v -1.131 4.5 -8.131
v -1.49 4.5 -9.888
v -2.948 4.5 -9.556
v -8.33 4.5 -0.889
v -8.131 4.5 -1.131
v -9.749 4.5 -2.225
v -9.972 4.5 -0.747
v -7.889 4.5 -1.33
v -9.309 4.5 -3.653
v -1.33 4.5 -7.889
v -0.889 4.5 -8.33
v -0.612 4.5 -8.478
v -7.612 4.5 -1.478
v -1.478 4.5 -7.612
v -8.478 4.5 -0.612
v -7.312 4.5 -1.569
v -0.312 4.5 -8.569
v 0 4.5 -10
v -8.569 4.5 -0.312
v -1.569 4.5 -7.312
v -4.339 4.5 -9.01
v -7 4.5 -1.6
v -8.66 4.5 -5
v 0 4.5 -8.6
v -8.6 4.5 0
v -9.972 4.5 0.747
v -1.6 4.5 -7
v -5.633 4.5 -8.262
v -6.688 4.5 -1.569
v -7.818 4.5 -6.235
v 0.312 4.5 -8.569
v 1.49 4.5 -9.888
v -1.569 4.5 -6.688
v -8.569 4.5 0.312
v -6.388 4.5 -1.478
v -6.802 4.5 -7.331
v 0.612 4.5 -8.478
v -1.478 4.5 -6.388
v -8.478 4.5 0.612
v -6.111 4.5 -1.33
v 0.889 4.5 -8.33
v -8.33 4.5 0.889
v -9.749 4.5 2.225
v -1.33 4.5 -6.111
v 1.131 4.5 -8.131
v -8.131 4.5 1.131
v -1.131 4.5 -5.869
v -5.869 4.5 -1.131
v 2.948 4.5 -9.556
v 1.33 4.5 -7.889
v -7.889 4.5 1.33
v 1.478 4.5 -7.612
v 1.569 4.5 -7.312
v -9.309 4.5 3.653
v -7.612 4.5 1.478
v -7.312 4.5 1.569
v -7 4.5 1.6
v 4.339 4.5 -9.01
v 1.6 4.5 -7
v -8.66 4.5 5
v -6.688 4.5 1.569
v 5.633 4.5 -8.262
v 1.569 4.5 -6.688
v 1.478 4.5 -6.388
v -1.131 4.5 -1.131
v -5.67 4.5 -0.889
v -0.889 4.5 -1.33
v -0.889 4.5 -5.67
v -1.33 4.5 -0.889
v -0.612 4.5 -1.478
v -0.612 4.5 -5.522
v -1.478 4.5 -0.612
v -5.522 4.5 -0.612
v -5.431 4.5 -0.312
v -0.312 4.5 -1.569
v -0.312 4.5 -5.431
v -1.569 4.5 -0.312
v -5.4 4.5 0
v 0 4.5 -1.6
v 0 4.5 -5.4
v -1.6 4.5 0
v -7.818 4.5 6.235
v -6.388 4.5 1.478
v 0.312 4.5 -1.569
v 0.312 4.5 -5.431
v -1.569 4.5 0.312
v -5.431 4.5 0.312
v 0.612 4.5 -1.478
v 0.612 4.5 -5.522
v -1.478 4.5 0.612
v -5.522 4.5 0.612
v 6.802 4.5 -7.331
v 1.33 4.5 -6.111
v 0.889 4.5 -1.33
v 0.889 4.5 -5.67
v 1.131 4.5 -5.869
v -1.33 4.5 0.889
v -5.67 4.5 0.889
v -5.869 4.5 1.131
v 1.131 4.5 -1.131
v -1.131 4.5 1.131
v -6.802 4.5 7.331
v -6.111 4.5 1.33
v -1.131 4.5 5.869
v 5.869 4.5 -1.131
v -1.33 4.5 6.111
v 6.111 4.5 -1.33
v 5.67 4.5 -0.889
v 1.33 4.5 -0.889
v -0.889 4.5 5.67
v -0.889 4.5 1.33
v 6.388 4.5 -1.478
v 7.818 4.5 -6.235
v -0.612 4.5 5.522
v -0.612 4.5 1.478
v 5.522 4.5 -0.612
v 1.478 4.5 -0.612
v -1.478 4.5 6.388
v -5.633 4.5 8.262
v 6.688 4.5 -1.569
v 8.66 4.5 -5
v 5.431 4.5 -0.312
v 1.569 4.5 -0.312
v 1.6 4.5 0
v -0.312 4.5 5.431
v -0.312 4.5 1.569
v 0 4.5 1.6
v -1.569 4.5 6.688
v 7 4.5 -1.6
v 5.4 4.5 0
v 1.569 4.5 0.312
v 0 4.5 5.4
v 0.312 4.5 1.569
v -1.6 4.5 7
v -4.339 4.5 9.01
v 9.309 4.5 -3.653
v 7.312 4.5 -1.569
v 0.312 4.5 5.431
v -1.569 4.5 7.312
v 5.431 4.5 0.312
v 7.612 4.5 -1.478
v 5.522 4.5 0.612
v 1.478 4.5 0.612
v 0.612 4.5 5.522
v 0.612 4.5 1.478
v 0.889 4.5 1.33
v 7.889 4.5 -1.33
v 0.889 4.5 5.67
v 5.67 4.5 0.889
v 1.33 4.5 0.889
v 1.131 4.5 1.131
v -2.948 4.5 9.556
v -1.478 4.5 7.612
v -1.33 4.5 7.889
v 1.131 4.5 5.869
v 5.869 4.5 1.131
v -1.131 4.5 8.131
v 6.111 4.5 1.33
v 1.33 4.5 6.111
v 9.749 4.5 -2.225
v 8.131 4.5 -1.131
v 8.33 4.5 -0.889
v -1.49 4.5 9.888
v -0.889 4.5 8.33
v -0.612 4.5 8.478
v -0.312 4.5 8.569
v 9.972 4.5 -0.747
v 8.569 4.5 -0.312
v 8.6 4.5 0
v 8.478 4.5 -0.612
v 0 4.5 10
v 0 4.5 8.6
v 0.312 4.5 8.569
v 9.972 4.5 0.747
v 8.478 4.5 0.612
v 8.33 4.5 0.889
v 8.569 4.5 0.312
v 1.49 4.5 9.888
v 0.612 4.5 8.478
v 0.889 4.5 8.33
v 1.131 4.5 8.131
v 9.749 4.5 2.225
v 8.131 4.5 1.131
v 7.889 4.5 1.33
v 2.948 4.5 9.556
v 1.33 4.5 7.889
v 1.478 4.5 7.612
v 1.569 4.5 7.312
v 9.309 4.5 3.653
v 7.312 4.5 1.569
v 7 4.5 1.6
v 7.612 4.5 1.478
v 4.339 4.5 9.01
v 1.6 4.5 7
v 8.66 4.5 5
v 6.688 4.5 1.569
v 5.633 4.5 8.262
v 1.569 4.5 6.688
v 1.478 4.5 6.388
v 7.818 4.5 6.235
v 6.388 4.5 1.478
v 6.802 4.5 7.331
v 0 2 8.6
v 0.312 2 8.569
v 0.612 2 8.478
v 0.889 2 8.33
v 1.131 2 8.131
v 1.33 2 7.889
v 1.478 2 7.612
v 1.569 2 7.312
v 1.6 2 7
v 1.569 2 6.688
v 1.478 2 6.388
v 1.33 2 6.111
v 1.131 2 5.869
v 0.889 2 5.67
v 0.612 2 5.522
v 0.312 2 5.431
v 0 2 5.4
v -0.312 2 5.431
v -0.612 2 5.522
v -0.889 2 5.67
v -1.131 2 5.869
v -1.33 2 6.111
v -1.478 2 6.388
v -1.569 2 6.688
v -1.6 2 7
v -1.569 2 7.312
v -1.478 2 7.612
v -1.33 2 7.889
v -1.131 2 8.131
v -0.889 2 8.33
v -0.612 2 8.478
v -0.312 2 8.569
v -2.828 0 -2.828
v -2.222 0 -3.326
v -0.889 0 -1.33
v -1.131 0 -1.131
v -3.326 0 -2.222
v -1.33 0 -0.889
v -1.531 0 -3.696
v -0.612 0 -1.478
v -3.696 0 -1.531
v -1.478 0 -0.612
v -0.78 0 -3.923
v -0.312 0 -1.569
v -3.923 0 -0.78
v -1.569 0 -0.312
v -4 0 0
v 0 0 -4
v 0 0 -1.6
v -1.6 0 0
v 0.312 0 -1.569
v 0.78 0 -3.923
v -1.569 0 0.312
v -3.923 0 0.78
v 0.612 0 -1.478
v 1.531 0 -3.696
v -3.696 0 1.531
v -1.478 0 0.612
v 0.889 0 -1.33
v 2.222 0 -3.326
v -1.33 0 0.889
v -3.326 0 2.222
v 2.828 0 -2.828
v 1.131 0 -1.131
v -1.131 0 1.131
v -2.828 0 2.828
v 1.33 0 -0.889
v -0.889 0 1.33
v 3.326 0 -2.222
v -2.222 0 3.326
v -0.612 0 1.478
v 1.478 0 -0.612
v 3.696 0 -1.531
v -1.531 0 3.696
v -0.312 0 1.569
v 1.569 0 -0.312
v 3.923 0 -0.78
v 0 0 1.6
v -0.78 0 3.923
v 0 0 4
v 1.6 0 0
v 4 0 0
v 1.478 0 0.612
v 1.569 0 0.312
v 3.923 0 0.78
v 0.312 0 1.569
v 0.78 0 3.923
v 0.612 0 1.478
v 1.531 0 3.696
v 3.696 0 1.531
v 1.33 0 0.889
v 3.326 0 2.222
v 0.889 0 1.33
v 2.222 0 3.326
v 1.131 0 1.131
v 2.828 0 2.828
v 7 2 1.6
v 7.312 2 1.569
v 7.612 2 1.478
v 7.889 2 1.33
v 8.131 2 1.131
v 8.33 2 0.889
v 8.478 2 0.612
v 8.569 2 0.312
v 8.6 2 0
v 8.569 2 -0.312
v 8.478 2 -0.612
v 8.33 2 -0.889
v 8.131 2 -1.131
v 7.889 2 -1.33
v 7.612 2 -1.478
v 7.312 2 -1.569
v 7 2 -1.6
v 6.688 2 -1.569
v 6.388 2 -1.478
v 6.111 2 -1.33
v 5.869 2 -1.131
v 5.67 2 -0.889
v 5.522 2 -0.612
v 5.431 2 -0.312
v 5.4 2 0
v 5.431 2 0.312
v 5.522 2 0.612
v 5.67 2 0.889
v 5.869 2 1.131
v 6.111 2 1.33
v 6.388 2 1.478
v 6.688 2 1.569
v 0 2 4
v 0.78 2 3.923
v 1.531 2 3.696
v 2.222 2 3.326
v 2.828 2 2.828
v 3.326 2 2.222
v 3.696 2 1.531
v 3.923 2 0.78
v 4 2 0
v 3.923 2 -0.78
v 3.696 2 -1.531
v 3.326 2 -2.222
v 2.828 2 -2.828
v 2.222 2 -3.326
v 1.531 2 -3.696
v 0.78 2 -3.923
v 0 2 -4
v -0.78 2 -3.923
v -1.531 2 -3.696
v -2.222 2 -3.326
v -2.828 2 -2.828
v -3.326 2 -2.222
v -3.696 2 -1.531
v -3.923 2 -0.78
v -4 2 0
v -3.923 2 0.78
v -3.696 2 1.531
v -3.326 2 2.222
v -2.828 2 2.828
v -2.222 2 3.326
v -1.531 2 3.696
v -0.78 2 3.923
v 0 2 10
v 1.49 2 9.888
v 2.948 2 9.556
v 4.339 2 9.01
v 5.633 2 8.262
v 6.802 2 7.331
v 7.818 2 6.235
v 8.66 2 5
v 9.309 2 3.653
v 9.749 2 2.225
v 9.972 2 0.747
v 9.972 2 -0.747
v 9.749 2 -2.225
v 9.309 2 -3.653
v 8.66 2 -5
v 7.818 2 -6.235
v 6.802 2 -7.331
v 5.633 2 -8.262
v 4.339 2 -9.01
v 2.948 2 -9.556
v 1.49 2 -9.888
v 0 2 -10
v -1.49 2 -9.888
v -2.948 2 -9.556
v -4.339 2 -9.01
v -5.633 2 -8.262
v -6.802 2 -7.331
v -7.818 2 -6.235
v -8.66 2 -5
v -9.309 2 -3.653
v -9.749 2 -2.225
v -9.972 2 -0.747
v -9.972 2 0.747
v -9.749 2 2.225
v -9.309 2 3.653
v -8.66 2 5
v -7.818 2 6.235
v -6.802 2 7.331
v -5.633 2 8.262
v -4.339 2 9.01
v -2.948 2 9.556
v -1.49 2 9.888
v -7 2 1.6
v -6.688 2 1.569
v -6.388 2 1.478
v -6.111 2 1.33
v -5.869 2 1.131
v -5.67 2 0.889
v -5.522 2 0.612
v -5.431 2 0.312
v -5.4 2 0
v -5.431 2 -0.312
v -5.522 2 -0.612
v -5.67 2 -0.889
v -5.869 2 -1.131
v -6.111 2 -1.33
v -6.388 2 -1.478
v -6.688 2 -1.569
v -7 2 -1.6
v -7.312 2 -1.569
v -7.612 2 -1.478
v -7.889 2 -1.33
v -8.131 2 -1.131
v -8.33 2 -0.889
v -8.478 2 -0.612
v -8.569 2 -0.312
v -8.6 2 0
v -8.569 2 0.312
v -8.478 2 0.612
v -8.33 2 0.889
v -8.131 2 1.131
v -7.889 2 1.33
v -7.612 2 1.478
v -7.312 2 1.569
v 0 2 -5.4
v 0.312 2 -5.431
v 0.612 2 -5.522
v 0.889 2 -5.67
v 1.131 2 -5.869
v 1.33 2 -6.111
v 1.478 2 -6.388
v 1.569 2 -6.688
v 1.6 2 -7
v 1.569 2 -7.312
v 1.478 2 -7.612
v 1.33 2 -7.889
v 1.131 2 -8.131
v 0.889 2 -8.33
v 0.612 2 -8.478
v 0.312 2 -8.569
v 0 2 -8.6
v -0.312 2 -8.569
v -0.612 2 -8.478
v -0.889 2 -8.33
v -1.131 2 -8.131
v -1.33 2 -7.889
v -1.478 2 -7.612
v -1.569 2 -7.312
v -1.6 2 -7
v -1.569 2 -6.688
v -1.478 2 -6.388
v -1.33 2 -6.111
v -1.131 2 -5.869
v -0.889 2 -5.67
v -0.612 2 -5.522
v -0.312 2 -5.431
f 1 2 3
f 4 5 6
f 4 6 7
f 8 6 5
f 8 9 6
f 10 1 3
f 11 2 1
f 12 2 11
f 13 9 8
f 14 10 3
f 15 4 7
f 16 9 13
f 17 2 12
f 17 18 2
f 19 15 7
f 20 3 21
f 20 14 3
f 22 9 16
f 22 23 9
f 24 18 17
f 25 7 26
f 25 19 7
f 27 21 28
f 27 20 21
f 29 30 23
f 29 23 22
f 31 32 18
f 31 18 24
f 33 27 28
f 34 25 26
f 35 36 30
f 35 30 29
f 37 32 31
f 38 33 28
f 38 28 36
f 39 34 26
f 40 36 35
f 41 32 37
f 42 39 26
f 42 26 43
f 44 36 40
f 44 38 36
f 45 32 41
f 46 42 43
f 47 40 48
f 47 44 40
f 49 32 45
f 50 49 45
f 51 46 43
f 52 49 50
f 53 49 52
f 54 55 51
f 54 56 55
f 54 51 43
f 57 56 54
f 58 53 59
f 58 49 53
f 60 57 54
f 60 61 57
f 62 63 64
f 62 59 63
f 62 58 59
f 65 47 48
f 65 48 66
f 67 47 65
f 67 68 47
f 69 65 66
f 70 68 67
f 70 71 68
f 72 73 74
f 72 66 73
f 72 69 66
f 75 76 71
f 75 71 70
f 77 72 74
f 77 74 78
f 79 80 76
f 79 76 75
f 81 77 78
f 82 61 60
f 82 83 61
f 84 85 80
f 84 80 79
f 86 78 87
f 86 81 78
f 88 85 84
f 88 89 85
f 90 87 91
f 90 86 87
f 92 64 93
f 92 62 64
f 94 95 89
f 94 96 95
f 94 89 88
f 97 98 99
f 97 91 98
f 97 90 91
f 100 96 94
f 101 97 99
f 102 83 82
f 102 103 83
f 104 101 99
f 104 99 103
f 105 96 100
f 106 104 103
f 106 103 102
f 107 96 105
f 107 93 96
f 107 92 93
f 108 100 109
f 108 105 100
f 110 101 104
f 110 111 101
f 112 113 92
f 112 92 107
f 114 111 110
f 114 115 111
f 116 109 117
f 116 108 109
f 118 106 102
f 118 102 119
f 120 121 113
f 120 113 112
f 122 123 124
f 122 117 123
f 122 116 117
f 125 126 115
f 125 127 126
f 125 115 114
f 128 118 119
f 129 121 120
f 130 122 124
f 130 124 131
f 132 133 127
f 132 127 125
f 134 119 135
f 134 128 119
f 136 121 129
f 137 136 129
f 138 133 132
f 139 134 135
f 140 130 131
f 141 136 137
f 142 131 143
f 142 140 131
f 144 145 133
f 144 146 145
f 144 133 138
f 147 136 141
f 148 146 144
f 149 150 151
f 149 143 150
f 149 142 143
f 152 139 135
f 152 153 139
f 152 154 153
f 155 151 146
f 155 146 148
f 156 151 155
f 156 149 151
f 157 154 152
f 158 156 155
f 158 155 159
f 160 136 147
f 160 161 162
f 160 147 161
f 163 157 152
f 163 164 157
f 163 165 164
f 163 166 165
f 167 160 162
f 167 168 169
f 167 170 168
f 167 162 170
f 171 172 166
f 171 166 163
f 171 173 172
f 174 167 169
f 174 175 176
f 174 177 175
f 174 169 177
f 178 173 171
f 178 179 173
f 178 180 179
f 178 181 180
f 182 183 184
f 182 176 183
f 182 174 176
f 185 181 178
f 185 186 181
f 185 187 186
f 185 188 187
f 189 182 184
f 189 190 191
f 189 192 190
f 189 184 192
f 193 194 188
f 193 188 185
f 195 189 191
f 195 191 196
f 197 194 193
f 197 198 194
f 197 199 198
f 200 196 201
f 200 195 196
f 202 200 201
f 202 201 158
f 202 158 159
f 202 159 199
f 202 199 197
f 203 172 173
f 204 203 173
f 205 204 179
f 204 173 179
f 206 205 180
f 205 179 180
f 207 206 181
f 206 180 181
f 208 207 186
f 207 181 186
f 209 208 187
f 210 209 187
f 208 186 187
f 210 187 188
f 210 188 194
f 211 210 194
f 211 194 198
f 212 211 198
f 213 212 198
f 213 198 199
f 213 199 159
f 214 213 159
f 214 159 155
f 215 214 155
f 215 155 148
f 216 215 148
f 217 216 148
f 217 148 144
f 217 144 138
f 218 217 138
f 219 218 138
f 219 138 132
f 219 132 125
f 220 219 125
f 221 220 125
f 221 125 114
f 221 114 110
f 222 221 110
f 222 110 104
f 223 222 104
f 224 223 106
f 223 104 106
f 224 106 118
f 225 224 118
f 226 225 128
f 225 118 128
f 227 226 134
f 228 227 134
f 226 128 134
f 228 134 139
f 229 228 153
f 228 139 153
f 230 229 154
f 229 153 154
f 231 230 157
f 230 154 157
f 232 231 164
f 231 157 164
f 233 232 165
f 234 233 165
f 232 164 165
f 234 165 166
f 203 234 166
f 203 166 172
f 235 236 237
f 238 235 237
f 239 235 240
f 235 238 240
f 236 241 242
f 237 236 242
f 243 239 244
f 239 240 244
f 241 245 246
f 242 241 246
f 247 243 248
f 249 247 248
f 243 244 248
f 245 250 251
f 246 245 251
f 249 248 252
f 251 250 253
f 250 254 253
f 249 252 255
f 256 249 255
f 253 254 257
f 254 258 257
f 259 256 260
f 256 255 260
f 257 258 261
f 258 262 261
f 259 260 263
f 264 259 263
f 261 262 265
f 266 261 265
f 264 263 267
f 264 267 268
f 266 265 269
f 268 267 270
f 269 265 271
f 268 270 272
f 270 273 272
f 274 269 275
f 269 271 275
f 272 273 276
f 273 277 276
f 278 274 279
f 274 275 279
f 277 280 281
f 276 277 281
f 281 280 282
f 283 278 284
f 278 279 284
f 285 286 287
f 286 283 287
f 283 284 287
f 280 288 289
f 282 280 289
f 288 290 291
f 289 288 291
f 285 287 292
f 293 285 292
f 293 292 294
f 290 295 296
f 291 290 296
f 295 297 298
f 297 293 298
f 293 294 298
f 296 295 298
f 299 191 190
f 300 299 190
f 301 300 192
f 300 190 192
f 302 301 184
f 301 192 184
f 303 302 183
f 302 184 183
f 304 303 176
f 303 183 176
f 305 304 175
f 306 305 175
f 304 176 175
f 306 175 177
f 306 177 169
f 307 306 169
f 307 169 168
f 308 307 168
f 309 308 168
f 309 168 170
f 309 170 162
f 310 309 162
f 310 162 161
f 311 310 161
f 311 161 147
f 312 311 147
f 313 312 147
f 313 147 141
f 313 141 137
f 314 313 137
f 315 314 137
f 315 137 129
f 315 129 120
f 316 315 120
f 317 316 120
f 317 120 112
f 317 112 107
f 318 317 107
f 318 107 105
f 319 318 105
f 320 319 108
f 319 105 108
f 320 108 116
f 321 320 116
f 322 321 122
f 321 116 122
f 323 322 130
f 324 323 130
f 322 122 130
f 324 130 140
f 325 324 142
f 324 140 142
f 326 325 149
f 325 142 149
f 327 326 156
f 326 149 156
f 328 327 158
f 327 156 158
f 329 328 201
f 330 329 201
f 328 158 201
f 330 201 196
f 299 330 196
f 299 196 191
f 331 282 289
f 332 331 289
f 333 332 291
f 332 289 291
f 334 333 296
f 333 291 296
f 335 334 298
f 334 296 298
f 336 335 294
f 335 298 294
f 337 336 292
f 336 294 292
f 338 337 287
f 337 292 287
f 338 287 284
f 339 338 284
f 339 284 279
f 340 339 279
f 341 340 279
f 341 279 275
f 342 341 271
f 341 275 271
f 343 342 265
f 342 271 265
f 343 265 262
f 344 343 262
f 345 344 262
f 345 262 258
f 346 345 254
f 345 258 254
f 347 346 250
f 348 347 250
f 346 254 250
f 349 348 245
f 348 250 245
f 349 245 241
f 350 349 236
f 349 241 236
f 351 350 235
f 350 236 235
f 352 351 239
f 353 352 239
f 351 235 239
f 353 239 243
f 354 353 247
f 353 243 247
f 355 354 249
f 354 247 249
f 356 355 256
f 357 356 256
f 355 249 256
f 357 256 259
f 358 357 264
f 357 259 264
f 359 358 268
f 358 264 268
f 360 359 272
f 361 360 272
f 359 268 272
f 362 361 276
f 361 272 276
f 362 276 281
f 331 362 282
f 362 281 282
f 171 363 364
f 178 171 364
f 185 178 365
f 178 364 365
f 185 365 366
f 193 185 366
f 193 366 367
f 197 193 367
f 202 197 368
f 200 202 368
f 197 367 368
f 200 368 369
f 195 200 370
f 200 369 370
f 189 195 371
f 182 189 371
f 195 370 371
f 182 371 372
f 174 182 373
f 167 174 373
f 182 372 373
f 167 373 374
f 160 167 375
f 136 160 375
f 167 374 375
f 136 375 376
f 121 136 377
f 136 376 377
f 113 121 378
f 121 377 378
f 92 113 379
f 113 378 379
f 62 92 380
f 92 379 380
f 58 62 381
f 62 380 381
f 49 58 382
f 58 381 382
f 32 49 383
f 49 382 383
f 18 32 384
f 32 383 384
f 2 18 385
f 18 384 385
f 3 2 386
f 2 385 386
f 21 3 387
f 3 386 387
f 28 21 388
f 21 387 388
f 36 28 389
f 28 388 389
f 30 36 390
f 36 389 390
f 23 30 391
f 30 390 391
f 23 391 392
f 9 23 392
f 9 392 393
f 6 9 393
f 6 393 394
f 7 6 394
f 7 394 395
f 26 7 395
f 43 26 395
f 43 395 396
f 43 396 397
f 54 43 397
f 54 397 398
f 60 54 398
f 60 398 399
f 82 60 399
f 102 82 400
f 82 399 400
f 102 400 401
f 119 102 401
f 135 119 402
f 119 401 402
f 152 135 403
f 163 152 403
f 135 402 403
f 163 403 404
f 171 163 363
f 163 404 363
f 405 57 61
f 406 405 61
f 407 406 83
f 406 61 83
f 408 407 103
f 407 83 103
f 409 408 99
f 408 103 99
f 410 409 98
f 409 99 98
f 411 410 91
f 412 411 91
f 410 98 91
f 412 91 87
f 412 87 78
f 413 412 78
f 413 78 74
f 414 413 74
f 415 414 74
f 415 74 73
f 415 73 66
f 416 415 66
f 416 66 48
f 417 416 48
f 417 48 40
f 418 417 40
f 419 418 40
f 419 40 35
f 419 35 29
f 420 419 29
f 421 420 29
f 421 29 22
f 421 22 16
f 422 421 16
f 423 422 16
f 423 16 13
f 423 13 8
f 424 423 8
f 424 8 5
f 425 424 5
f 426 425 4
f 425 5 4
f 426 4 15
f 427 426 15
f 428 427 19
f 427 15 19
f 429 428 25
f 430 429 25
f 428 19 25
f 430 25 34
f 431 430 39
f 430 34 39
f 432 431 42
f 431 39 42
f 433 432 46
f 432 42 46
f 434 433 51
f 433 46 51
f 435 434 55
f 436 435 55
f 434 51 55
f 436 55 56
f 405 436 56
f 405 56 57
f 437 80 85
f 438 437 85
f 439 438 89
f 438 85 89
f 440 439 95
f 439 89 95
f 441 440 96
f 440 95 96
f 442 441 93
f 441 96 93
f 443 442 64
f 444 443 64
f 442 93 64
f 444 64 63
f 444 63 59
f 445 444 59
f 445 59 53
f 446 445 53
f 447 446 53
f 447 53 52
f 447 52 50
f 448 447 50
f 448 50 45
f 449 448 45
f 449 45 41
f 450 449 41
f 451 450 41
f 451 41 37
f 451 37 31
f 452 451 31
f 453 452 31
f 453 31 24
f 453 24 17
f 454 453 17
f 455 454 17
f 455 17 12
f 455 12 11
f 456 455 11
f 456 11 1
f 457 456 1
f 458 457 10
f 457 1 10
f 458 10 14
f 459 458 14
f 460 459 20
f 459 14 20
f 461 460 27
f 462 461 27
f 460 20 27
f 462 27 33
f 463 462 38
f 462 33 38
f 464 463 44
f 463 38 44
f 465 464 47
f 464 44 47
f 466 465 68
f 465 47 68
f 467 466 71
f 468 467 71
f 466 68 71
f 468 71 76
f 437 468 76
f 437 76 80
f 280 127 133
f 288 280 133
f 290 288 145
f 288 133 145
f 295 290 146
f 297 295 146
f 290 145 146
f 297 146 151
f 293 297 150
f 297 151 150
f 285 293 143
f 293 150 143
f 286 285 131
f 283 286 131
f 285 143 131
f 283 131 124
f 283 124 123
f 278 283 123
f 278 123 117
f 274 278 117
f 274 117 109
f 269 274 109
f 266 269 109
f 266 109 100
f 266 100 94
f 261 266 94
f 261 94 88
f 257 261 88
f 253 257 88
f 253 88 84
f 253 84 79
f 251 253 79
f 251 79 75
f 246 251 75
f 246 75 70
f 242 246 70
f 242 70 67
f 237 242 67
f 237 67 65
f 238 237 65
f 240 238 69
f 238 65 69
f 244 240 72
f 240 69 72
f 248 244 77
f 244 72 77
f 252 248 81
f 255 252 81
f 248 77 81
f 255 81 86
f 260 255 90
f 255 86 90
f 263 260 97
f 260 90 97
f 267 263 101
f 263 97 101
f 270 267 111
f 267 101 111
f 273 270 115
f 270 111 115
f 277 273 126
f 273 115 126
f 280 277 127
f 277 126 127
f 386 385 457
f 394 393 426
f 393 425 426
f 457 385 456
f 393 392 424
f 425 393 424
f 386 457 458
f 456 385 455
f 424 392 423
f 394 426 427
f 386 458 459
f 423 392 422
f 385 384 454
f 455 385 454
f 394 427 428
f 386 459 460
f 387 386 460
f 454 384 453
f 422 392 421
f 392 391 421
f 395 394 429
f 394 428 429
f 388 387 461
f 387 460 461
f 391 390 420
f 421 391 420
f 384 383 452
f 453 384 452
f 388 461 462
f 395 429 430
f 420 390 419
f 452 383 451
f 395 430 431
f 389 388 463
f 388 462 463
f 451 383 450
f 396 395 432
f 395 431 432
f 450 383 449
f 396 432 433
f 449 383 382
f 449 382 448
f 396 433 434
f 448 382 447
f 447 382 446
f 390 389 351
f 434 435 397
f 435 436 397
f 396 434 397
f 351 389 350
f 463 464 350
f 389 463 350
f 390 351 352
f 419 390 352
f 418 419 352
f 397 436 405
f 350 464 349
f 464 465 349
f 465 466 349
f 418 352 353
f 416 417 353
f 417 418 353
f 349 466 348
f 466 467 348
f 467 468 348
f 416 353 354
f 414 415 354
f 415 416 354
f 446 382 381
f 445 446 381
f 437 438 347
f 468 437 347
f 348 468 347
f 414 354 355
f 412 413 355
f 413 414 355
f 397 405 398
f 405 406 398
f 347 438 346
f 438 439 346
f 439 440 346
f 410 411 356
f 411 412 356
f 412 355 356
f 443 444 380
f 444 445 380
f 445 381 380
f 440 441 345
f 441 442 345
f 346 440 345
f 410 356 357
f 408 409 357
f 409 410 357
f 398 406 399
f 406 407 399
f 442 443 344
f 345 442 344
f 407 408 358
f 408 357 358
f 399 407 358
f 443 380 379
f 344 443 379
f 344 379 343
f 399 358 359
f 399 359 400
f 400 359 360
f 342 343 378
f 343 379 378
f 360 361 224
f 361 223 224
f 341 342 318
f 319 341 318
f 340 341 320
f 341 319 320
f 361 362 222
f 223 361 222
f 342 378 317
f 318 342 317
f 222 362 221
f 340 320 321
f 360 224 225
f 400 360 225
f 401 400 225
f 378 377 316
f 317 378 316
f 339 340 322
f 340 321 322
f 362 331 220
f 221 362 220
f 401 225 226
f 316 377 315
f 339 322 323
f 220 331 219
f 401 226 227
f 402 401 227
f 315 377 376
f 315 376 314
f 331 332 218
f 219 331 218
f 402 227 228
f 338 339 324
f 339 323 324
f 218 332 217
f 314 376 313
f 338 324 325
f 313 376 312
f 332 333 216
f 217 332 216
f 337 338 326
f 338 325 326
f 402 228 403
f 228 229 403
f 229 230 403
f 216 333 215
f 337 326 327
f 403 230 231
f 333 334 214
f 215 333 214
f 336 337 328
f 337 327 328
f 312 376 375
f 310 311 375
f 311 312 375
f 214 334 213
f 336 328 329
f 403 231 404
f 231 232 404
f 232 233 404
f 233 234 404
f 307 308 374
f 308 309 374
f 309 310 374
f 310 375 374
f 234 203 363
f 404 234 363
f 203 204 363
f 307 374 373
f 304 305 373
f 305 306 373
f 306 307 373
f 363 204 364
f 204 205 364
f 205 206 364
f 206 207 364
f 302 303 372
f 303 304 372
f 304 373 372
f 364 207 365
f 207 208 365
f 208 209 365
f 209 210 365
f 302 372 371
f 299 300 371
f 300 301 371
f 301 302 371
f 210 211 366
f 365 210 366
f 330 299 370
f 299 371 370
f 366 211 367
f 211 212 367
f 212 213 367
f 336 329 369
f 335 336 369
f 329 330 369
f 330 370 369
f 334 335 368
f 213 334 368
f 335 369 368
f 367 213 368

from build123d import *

# Parameters (mm, degrees)
SKETCH_1_R          = 4
EXTRUDE_1_DEPTH     = 2
SKETCH_2_R          = 10
EXTRUDE_2_DEPTH     = 2.5
SKETCH_3_R          = 1.6
CUT_EXTRUDE_1_DEPTH = 15.84082208


with BuildPart() as part:
    # 草图1 → 凸台-拉伸1 (new body)
    with BuildSketch(Plane(origin=(0, 0, 0), x_dir=(1, 0, 0), z_dir=(0, 1, 0))):
        with Locations(Location((0, 0, 0), (0, 0, 270))):
            Circle(SKETCH_1_R)
    extrude(amount=EXTRUDE_1_DEPTH)

    # 草图2 → 凸台-拉伸2 (add)
    with BuildSketch(Plane(origin=(0, 2, 0), x_dir=(1, 0, 0), z_dir=(0, 1, 0))):
        with Locations(Location((0, 0, 0), (0, 0, 270))):
            Circle(SKETCH_2_R)
    extrude(amount=EXTRUDE_2_DEPTH)

    # 草图3 → 切除-拉伸1 (cut, through all)
    with BuildSketch(Plane(origin=(0, 4.5, 0), x_dir=(1, 0, 0), z_dir=(0, 1, 0))):
        with Locations(Location((0, 0, 0), (0, 0, 270))):
            Circle(SKETCH_3_R)
        with Locations(Location((0, 7, 0), (0, 0, 270))):
            Circle(SKETCH_3_R)
        with Locations(Location((7, 0, 0), (0, 0, 270))):
            Circle(SKETCH_3_R)
        with Locations(Location((0, -7, 0), (0, 0, 270))):
            Circle(SKETCH_3_R)
        with Locations(Location((-7, 0, 0), (0, 0, 270))):
            Circle(SKETCH_3_R)
    extrude(amount=-CUT_EXTRUDE_1_DEPTH, mode=Mode.SUBTRACT)


solid = part.part
